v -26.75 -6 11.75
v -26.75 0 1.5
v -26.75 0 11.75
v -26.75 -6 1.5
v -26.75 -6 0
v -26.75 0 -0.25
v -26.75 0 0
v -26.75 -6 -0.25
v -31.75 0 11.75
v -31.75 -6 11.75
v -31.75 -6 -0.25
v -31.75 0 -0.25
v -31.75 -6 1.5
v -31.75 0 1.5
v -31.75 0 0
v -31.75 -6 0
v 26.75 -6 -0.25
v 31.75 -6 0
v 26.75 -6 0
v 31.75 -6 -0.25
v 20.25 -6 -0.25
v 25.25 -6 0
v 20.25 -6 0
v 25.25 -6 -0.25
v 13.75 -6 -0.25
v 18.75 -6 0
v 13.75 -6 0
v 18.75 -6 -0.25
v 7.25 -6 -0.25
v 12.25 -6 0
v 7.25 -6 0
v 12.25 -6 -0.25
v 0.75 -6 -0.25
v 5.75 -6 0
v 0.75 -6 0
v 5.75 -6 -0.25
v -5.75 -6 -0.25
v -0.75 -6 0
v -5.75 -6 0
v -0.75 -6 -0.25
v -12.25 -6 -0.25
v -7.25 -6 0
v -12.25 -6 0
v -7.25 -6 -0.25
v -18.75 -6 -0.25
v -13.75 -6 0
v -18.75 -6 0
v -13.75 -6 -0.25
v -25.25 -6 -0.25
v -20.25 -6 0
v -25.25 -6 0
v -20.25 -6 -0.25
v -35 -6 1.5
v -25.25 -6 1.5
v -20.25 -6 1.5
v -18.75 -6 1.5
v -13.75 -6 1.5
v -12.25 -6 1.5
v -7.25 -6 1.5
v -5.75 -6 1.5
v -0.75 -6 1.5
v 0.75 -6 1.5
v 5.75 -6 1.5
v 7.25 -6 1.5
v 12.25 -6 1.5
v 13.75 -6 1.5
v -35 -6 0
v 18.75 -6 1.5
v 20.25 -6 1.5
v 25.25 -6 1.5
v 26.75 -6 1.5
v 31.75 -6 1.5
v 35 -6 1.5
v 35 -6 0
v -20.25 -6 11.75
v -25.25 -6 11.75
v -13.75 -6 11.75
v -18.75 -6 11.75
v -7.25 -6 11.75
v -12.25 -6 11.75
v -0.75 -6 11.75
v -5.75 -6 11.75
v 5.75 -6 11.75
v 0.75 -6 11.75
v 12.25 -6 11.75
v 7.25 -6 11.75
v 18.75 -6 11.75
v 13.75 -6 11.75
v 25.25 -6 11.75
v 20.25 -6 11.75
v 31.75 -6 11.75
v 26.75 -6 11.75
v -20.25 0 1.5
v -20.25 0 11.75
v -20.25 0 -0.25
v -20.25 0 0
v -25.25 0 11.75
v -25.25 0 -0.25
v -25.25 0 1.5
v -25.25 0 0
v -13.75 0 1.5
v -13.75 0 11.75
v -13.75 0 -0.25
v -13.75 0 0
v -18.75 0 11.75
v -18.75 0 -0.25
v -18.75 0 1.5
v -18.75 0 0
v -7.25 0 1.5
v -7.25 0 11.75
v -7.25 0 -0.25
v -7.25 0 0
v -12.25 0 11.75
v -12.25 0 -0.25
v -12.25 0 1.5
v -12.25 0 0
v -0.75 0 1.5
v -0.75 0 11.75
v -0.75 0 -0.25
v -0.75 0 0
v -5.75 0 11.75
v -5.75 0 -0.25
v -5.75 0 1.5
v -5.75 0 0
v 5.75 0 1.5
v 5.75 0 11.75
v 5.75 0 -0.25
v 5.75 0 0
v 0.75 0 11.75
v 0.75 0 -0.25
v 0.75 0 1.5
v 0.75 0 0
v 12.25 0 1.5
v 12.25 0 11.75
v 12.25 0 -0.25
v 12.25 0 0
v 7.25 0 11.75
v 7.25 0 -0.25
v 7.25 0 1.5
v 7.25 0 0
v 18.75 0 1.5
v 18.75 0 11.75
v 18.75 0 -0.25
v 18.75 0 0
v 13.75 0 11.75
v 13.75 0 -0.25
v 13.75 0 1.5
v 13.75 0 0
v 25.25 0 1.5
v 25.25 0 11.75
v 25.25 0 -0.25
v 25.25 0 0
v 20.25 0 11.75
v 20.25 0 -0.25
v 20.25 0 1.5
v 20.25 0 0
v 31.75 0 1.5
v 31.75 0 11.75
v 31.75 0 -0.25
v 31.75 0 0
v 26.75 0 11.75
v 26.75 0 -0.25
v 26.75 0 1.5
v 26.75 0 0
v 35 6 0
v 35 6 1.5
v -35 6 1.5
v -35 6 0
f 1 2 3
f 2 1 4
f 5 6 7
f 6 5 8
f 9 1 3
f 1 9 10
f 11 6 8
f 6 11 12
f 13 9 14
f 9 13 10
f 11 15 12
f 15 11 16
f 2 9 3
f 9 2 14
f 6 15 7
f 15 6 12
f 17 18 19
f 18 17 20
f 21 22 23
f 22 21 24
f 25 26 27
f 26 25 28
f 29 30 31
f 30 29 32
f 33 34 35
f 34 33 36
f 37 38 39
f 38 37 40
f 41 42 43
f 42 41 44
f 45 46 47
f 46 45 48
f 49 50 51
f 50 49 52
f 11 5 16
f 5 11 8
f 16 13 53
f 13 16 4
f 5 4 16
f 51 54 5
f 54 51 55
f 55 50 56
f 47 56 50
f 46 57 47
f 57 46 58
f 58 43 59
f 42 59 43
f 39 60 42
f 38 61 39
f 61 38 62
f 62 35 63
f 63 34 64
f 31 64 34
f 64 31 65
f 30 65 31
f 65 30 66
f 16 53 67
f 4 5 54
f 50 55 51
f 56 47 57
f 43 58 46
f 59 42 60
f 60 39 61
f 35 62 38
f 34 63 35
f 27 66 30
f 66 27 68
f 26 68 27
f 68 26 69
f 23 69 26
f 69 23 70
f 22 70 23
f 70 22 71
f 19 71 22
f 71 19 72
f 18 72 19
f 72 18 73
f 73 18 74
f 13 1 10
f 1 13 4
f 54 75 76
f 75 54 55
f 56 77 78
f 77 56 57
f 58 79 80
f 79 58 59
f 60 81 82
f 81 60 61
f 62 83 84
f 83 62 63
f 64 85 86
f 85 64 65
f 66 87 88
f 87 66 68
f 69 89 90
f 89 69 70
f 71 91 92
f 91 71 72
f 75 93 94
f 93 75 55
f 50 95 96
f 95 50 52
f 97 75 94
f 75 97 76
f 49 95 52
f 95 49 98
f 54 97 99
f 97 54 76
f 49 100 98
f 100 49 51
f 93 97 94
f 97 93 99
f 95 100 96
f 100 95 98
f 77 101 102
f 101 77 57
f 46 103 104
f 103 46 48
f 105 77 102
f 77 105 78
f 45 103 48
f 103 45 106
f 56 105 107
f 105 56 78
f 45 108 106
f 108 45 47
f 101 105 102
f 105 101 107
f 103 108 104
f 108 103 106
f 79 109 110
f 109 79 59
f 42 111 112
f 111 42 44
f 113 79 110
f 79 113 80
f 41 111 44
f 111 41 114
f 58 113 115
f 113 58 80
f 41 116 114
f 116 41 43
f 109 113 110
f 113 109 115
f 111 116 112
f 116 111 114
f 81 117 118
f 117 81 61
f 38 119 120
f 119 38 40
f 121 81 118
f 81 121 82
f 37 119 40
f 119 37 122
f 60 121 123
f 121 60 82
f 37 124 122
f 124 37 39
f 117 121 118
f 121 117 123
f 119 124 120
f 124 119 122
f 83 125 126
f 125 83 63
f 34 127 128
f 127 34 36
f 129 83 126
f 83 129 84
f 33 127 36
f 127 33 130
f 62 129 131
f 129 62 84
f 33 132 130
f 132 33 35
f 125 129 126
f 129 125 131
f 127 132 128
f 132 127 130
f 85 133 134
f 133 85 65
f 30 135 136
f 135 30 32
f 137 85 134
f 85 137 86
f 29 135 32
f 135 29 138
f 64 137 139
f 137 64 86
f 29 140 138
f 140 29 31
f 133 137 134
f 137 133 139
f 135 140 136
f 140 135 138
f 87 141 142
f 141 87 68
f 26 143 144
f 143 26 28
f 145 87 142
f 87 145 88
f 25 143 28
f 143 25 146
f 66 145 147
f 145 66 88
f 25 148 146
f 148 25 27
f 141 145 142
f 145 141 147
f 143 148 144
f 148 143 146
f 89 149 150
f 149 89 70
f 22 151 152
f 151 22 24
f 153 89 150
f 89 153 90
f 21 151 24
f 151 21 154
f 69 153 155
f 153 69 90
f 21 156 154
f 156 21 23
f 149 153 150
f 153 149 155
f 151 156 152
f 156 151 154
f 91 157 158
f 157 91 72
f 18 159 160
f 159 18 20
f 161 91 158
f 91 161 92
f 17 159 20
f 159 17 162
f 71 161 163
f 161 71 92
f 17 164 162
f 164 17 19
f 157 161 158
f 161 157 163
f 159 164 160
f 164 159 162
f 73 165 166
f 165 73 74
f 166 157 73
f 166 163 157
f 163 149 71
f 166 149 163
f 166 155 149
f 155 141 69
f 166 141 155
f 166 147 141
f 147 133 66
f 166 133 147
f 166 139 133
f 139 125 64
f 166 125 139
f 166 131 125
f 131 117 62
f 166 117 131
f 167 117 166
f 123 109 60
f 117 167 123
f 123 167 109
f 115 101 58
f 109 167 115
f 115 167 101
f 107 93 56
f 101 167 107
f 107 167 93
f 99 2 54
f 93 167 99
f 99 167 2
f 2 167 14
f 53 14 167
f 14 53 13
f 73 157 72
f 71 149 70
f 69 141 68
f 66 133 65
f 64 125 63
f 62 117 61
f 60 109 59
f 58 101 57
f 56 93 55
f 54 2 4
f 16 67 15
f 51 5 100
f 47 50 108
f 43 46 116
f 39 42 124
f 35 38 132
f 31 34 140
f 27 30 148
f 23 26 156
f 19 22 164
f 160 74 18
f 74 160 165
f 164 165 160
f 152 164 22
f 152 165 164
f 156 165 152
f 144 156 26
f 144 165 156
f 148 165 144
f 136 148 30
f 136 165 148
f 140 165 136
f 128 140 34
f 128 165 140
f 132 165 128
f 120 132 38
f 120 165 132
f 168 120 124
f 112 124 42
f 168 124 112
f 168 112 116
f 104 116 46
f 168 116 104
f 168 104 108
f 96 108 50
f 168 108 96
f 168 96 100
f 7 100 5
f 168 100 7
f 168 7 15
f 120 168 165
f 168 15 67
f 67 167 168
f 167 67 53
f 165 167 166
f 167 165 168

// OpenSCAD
// 10-well comb for casting agarose gels
// Print orientation: flat on bed, teeth pointing down (-Z)

// ---------- Parameters ----------
plate_len    = 70;    // spine length (X)
plate_w      = 12;    // spine width (Y)
plate_t      = 1.5;   // plate thickness (Z)

tooth_count  = 10;    // number of teeth
tooth_w      = 5.0;   // tooth width (X)
tooth_len    = 12;    // tooth length (Y)
tooth_h      = 12;    // tooth height from plate top (Z)

gap          = 1.5;   // gap between teeth (X)
eps          = 0.5;   // cutter overshoot past faces (Z)

$fn = 64;

// ---------- Derived ----------
pitch    = tooth_w + gap;
x_start  = -(tooth_count - 1) * pitch / 2;   // centre row on origin
plate_z0 = -plate_t / 2 + eps;               // cutter start below bottom face

// ---------- Model ----------
union() {
    // Base plate
    translate([-plate_len / 2, -plate_w / 2, 0])
        cube([plate_len, plate_w, plate_t]);

    // Teeth
    for (i = [0 : tooth_count - 1])
        translate([x_start + i * pitch - tooth_w / 2, -tooth_len / 2, plate_z0])
            cube([tooth_w, tooth_len / 2, tooth_h]);
}
